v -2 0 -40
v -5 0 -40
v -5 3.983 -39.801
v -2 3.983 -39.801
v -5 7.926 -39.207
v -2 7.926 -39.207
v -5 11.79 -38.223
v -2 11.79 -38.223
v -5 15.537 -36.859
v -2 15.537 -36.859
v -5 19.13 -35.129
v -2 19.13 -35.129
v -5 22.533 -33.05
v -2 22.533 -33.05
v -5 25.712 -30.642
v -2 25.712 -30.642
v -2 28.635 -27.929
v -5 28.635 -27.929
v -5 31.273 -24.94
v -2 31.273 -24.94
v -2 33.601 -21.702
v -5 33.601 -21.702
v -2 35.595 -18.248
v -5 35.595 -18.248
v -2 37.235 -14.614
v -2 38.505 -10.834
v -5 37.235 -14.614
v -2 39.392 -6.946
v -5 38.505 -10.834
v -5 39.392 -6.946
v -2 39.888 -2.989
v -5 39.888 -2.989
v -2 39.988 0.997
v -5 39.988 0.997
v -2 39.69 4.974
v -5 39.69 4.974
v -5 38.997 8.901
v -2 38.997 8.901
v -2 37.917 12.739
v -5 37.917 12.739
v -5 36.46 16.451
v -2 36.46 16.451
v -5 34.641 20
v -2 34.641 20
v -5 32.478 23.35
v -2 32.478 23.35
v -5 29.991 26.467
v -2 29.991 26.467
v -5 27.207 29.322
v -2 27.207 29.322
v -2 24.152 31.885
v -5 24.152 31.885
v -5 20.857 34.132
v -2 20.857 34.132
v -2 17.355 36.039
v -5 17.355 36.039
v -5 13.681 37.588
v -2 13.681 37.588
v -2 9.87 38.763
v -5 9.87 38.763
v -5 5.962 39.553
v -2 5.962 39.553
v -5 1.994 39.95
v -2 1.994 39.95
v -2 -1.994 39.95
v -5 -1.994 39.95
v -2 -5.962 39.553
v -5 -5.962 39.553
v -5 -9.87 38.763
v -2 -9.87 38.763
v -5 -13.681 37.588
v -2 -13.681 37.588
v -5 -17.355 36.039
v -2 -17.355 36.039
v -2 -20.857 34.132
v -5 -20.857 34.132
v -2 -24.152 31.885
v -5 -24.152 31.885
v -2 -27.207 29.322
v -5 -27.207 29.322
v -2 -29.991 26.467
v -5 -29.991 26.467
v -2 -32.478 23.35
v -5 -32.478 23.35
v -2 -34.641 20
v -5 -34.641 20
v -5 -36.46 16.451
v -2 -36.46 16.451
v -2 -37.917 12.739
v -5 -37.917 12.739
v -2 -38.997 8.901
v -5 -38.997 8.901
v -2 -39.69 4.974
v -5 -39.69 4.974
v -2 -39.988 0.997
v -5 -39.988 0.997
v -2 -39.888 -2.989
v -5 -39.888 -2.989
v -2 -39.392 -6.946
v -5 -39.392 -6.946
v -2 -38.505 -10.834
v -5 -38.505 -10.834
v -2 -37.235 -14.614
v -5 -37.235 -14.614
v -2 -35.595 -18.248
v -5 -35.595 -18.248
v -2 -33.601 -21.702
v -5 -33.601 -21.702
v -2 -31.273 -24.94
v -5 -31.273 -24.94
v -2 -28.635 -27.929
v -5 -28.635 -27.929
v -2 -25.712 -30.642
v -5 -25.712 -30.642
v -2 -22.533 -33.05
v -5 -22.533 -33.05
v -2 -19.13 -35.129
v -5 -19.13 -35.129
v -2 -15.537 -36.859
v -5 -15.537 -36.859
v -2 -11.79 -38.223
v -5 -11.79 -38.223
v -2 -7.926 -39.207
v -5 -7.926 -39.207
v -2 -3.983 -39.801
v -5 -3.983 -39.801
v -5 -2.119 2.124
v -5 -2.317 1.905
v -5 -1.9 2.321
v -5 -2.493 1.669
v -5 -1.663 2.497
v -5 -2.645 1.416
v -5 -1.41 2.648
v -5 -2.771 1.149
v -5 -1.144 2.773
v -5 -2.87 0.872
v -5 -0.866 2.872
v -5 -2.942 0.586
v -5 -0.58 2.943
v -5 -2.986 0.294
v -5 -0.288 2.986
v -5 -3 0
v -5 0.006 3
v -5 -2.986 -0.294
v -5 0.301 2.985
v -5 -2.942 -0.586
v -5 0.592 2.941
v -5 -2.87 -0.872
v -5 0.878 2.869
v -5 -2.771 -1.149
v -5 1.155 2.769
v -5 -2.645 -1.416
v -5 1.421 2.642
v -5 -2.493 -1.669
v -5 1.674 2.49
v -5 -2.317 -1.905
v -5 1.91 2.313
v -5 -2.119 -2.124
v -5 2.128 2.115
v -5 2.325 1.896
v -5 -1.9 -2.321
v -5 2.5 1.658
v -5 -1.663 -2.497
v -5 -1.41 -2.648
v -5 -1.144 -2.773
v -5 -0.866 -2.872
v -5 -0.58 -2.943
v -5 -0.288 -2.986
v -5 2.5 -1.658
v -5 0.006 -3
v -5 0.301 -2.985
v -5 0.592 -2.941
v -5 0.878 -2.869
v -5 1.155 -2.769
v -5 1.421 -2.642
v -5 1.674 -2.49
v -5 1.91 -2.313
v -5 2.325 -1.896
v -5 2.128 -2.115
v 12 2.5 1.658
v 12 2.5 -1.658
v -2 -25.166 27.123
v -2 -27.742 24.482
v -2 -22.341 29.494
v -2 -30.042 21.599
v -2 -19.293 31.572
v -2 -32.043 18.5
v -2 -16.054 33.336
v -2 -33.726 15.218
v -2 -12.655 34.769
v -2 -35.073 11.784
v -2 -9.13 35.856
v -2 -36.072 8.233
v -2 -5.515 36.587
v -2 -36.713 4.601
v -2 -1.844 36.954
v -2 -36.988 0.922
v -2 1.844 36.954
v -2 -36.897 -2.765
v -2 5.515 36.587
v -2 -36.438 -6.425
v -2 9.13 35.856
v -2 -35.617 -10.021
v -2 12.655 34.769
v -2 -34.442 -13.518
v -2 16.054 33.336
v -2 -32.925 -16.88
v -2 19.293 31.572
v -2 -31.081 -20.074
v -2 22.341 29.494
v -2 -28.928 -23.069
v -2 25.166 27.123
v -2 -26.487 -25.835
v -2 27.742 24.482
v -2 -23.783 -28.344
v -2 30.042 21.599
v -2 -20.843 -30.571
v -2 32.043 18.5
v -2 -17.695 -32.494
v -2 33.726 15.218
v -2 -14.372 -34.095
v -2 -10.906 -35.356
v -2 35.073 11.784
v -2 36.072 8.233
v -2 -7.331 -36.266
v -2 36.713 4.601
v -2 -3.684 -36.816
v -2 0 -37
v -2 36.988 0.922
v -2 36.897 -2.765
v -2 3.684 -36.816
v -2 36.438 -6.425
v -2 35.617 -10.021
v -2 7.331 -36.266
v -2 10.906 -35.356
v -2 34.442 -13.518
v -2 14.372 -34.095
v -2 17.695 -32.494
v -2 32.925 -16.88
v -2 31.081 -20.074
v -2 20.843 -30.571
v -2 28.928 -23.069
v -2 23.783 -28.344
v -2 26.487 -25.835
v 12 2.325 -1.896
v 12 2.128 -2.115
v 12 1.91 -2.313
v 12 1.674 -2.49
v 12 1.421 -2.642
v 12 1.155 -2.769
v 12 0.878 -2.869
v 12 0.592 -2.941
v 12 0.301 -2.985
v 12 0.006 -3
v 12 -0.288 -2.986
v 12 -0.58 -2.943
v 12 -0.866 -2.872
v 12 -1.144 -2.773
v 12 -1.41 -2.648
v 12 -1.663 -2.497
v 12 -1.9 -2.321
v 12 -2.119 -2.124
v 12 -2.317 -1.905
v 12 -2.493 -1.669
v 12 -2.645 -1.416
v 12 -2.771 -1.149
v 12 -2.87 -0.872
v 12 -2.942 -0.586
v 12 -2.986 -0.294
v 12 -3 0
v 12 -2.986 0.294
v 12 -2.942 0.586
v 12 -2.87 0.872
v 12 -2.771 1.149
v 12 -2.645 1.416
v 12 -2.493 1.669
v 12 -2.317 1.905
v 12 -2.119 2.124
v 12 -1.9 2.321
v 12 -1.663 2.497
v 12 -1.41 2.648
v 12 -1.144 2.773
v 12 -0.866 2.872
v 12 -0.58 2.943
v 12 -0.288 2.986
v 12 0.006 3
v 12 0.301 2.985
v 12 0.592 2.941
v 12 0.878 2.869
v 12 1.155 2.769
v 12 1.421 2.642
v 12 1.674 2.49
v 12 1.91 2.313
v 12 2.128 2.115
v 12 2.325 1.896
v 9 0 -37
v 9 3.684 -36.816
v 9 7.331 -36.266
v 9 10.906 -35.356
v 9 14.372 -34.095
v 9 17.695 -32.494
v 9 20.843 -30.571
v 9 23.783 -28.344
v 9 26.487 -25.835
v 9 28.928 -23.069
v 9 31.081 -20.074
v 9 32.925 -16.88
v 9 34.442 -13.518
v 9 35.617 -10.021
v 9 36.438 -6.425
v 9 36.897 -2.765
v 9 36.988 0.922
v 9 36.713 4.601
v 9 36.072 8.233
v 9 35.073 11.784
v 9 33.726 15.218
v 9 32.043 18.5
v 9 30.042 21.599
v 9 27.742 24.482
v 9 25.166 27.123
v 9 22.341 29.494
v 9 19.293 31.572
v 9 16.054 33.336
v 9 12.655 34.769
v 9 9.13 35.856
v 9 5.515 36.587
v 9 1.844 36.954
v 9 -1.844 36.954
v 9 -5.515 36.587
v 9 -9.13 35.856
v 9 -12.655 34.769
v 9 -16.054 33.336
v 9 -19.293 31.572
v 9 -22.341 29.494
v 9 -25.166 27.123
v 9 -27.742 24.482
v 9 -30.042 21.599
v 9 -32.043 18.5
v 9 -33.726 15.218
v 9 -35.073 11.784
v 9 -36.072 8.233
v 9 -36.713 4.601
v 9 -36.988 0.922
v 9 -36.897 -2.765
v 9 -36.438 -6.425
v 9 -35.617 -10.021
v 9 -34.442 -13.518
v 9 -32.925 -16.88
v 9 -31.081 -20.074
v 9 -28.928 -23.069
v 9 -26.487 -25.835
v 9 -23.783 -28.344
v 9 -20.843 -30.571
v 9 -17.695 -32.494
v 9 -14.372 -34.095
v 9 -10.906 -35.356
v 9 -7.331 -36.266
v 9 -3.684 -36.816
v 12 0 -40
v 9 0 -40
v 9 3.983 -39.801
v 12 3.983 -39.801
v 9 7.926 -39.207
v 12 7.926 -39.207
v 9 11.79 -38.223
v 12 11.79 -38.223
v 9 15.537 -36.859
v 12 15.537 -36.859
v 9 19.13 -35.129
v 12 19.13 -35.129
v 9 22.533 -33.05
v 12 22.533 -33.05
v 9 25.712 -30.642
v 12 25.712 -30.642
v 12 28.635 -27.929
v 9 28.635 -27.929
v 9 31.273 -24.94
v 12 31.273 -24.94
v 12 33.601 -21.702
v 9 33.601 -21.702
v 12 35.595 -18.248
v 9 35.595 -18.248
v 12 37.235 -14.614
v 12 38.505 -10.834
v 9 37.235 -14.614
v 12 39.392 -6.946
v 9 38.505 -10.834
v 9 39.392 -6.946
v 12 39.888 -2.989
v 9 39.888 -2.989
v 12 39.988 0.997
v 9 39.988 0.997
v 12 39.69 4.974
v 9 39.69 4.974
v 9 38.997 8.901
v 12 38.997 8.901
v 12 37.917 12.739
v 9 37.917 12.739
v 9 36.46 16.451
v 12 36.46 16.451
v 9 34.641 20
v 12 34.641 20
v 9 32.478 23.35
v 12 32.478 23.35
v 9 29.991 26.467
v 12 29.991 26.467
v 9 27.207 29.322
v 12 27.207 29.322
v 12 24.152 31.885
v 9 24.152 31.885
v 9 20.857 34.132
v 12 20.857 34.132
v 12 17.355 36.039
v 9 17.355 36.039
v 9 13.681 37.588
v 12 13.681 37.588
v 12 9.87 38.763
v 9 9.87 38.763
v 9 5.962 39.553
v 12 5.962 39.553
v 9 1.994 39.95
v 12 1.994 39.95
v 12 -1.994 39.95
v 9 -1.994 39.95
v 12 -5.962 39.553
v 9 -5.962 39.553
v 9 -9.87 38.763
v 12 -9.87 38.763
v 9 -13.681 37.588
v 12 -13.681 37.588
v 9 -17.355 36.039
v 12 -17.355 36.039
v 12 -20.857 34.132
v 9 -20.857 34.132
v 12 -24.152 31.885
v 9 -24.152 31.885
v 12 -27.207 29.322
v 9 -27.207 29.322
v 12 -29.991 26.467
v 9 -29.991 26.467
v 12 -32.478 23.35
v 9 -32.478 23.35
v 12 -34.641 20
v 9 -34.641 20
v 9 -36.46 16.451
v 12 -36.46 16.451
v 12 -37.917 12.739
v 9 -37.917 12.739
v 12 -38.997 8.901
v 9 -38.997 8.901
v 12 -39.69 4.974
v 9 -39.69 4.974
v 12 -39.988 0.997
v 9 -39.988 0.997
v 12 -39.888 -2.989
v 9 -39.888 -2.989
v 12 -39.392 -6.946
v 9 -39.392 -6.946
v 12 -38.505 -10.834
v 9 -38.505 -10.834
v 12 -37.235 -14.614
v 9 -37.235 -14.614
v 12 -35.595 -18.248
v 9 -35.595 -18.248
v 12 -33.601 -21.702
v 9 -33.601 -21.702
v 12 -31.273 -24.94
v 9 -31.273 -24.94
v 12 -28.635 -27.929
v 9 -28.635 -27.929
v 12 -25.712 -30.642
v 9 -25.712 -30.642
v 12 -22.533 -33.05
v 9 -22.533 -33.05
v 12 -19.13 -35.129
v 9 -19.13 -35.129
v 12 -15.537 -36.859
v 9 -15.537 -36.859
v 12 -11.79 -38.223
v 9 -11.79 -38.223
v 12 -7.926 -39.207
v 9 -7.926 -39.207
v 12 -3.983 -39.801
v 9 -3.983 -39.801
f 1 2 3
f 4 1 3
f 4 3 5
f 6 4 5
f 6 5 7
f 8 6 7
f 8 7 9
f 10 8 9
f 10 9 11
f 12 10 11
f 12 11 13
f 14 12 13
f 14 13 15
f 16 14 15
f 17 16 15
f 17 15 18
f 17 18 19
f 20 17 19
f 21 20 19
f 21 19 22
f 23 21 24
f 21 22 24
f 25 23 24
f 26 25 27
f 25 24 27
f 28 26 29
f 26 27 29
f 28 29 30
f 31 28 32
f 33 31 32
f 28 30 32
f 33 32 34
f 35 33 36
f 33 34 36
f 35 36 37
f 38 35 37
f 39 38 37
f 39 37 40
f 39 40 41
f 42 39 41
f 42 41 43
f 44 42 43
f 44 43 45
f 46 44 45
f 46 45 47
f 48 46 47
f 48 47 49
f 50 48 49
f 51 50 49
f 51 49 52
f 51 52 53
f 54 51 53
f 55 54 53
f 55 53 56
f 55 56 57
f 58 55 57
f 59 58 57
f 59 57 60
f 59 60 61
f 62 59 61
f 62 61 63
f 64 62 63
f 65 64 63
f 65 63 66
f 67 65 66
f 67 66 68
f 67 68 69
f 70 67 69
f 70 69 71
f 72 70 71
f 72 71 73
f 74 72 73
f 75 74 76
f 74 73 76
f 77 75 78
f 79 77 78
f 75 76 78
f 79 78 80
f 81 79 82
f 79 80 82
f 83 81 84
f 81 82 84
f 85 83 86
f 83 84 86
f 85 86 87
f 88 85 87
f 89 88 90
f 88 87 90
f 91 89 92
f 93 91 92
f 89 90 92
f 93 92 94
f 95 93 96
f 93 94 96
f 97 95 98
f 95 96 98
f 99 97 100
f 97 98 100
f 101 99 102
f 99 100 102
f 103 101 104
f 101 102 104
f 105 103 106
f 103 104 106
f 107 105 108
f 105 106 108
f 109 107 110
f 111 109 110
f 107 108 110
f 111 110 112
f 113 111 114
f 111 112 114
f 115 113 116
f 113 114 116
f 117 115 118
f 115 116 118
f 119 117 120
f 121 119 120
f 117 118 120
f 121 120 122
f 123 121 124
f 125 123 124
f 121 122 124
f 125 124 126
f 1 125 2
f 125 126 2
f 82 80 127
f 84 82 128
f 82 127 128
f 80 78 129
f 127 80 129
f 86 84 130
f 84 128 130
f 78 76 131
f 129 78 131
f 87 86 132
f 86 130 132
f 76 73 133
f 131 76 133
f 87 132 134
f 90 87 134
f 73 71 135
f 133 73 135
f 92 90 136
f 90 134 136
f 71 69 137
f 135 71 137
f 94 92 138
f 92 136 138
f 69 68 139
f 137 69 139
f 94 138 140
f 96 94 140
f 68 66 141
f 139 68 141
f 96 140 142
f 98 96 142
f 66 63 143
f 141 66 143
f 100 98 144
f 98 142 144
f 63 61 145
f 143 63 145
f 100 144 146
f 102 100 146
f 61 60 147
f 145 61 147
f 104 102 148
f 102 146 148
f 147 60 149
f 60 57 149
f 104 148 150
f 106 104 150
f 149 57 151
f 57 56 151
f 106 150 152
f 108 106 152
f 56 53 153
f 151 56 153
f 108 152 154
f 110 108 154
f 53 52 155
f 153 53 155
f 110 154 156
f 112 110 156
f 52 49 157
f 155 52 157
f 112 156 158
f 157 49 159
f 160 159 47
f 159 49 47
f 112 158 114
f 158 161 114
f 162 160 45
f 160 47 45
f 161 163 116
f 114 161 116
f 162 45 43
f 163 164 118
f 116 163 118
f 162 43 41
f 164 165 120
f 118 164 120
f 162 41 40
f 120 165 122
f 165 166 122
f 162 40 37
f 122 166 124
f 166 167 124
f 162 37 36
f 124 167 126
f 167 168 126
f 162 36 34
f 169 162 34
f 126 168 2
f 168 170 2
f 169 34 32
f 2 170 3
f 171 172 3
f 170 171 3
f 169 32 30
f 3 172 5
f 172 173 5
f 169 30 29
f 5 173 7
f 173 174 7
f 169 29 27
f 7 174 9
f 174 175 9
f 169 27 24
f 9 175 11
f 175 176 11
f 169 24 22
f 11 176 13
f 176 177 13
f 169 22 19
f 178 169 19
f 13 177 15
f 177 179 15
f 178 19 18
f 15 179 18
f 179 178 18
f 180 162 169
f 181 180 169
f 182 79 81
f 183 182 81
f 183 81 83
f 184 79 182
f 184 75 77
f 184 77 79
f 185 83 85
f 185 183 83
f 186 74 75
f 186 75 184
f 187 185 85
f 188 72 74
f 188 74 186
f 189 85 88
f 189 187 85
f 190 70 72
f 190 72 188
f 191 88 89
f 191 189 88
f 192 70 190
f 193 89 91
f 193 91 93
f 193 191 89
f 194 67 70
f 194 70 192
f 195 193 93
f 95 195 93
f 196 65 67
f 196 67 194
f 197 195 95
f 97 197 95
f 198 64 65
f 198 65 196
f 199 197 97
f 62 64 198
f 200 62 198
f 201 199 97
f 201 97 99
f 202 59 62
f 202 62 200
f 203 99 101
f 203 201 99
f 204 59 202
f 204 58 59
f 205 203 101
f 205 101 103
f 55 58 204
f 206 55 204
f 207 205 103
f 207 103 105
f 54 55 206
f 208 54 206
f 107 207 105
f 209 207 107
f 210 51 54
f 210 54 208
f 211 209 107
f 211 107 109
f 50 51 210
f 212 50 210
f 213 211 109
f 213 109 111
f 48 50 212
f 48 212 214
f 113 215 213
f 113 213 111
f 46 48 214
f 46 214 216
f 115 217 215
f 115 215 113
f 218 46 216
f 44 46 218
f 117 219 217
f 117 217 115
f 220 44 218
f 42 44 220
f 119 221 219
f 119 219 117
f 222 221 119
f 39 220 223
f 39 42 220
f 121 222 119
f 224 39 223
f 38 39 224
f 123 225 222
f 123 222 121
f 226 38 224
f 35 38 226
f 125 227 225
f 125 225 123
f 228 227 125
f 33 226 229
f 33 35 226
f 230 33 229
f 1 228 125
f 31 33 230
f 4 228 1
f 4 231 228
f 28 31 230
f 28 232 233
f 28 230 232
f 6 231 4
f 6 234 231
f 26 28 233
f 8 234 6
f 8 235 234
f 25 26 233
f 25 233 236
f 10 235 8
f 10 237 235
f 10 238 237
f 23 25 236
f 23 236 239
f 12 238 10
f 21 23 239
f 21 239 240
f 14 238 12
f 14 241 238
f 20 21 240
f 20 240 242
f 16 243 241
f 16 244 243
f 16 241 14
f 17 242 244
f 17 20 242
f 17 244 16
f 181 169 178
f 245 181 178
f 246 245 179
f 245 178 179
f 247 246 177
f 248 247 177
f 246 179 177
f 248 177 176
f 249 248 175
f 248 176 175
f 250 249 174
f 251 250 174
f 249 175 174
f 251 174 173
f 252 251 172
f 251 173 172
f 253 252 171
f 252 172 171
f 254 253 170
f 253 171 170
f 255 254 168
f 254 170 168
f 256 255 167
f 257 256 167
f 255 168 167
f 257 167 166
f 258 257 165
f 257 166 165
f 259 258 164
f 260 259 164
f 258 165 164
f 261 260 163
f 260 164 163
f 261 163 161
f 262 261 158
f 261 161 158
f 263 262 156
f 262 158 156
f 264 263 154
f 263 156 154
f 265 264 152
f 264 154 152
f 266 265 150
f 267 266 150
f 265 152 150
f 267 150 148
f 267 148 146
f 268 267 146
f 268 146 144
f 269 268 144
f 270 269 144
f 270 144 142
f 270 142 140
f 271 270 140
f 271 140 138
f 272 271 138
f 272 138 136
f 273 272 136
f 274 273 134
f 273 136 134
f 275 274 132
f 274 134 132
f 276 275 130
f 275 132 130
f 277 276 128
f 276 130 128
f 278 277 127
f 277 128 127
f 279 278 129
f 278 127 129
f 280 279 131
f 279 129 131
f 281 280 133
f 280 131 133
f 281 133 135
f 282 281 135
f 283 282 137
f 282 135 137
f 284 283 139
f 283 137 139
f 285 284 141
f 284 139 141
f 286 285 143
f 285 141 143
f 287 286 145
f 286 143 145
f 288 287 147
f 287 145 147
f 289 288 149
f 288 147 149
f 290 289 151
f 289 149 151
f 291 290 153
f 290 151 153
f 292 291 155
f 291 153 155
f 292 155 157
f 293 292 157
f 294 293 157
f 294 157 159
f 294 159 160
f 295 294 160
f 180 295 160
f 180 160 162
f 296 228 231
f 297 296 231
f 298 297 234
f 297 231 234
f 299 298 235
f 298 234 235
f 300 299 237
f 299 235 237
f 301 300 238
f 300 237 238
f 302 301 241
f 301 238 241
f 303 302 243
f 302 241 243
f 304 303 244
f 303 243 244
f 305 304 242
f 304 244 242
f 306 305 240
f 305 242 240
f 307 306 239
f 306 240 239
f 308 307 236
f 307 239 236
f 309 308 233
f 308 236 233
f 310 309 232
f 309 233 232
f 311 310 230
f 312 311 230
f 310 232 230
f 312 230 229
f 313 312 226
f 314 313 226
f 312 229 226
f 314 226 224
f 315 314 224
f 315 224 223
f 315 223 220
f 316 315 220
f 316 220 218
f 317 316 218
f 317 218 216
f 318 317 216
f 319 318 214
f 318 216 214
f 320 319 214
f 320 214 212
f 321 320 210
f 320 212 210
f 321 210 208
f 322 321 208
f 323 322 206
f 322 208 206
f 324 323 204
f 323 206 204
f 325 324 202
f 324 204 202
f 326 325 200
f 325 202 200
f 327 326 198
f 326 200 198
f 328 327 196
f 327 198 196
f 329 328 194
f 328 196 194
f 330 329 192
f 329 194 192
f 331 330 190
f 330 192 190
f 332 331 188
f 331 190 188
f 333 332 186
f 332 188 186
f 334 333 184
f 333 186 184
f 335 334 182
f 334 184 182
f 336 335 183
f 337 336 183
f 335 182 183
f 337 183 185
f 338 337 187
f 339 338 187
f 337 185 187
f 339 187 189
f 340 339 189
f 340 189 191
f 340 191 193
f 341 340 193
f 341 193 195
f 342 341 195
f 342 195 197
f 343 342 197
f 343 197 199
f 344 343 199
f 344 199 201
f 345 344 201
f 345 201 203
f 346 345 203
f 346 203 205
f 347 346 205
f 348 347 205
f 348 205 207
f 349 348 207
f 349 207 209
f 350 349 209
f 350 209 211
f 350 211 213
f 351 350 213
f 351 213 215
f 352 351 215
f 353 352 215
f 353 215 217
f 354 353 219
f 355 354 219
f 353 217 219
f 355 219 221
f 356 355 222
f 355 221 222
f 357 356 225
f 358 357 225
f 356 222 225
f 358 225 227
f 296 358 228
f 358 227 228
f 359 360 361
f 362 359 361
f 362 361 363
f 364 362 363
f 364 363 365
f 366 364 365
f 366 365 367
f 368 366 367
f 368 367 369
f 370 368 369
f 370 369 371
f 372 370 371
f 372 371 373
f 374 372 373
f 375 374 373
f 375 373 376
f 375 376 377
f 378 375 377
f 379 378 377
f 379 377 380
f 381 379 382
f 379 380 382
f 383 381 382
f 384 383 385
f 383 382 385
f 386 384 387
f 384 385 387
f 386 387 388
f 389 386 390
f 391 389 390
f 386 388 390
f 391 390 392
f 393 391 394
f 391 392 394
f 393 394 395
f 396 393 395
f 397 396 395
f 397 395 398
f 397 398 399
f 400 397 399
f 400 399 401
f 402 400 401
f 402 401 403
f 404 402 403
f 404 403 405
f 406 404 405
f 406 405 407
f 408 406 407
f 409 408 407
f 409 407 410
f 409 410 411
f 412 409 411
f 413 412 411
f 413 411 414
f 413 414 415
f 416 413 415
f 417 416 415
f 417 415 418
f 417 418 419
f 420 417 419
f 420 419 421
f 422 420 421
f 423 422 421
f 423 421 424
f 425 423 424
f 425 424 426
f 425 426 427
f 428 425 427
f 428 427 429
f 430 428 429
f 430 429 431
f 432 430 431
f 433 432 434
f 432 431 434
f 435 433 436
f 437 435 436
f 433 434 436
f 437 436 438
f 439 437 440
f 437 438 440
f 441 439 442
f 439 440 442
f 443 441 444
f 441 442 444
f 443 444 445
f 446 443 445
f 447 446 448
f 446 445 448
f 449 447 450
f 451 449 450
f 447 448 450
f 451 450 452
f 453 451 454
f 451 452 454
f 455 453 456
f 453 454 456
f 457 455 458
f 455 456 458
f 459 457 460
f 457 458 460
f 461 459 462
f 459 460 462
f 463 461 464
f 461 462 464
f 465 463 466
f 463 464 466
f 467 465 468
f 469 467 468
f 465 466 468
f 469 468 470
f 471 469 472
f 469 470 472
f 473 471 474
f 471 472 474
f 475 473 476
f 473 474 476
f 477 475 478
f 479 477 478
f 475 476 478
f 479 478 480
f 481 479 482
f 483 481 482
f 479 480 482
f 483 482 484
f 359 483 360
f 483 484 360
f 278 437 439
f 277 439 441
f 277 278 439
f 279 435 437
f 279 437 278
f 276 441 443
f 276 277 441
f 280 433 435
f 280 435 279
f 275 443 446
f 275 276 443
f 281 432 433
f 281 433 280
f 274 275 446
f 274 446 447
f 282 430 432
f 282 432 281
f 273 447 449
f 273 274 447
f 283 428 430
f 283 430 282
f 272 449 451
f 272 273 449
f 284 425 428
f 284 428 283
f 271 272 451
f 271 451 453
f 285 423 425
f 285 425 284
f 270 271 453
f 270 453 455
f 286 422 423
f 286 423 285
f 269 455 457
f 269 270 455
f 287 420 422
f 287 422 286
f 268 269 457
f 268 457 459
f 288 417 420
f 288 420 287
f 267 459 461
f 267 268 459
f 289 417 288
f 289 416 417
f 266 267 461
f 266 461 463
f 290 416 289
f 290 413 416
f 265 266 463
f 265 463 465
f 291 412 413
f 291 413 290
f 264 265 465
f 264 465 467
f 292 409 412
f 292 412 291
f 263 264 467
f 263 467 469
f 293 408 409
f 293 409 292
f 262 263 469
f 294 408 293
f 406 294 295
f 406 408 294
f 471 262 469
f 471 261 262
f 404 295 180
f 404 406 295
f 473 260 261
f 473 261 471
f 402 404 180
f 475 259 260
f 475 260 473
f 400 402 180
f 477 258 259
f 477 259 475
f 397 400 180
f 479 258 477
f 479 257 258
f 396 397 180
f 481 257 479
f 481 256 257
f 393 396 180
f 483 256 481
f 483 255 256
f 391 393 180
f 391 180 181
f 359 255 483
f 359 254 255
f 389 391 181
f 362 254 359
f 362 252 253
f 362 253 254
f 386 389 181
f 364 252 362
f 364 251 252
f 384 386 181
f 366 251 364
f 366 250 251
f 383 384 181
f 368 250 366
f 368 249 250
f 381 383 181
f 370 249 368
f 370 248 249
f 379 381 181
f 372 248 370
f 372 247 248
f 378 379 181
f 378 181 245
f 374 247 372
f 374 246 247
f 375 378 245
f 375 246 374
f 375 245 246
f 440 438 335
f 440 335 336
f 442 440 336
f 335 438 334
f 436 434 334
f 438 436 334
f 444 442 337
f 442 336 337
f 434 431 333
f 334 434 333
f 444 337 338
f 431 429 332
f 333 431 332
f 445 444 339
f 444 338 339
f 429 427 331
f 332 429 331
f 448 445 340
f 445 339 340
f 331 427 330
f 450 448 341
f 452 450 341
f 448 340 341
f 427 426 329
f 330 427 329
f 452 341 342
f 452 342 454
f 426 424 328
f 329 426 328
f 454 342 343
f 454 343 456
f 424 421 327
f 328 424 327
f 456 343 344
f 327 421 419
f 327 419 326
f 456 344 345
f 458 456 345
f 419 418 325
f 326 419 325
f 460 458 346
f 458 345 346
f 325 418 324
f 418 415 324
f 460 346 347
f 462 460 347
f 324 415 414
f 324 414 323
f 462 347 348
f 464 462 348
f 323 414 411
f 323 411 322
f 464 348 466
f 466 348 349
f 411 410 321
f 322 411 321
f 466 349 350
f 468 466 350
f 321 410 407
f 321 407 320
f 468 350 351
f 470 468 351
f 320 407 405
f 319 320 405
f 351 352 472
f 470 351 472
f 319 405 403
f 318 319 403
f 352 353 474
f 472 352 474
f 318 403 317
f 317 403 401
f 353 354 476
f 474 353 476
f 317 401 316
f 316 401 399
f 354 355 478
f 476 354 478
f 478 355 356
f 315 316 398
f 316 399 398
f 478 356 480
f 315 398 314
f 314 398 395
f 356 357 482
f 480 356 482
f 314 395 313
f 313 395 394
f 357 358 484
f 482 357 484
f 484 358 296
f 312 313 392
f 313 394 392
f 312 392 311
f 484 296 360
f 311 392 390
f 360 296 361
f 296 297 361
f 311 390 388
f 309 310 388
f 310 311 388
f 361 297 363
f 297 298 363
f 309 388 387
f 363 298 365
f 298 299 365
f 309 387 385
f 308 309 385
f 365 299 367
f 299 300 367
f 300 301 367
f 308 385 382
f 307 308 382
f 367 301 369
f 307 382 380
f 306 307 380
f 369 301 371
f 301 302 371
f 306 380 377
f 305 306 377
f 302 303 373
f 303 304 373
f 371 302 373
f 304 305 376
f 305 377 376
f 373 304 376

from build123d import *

# Parameters (mm, degrees)
BASE_DEPTH           = 12
BASE_DEPTH_BACK      = 5
ESQUISSE1_R          = 40
VIDE_PNEU_DEPTH      = 9
VIDE_PNEU_DEPTH_BACK = 2
ESQUISSE4_R          = 40
ESQUISSE4_R_2        = 37


with BuildPart() as part:
    # Esquisse1 → BASE (new, two sides: drawn at the far end of the back side and taken through both)
    with BuildSketch(Plane(origin=(0, 0, 0), x_dir=(0, 0, -1), z_dir=(1, 0, 0)).offset(-BASE_DEPTH_BACK)):
        Circle(ESQUISSE1_R)
        with BuildLine():
            Line((-1.658312395, 2.5), (1.658312395, 2.5))
            ThreePointArc((1.658312395, 2.5), (0, -3), (-1.658312395, 2.5))
        make_face(mode=Mode.SUBTRACT)
    extrude(amount=BASE_DEPTH + BASE_DEPTH_BACK)

    # Esquisse4 → VIDE PNEU (cut, two sides: drawn at the far end of the back side and taken through both)
    with BuildSketch(Plane(origin=(0, 0, 0), x_dir=(0, 0, -1), z_dir=(1, 0, 0)).offset(-VIDE_PNEU_DEPTH_BACK)):
        Circle(ESQUISSE4_R)
        Circle(ESQUISSE4_R_2, mode=Mode.SUBTRACT)
    extrude(amount=VIDE_PNEU_DEPTH + VIDE_PNEU_DEPTH_BACK, mode=Mode.SUBTRACT)


solid = part.part
